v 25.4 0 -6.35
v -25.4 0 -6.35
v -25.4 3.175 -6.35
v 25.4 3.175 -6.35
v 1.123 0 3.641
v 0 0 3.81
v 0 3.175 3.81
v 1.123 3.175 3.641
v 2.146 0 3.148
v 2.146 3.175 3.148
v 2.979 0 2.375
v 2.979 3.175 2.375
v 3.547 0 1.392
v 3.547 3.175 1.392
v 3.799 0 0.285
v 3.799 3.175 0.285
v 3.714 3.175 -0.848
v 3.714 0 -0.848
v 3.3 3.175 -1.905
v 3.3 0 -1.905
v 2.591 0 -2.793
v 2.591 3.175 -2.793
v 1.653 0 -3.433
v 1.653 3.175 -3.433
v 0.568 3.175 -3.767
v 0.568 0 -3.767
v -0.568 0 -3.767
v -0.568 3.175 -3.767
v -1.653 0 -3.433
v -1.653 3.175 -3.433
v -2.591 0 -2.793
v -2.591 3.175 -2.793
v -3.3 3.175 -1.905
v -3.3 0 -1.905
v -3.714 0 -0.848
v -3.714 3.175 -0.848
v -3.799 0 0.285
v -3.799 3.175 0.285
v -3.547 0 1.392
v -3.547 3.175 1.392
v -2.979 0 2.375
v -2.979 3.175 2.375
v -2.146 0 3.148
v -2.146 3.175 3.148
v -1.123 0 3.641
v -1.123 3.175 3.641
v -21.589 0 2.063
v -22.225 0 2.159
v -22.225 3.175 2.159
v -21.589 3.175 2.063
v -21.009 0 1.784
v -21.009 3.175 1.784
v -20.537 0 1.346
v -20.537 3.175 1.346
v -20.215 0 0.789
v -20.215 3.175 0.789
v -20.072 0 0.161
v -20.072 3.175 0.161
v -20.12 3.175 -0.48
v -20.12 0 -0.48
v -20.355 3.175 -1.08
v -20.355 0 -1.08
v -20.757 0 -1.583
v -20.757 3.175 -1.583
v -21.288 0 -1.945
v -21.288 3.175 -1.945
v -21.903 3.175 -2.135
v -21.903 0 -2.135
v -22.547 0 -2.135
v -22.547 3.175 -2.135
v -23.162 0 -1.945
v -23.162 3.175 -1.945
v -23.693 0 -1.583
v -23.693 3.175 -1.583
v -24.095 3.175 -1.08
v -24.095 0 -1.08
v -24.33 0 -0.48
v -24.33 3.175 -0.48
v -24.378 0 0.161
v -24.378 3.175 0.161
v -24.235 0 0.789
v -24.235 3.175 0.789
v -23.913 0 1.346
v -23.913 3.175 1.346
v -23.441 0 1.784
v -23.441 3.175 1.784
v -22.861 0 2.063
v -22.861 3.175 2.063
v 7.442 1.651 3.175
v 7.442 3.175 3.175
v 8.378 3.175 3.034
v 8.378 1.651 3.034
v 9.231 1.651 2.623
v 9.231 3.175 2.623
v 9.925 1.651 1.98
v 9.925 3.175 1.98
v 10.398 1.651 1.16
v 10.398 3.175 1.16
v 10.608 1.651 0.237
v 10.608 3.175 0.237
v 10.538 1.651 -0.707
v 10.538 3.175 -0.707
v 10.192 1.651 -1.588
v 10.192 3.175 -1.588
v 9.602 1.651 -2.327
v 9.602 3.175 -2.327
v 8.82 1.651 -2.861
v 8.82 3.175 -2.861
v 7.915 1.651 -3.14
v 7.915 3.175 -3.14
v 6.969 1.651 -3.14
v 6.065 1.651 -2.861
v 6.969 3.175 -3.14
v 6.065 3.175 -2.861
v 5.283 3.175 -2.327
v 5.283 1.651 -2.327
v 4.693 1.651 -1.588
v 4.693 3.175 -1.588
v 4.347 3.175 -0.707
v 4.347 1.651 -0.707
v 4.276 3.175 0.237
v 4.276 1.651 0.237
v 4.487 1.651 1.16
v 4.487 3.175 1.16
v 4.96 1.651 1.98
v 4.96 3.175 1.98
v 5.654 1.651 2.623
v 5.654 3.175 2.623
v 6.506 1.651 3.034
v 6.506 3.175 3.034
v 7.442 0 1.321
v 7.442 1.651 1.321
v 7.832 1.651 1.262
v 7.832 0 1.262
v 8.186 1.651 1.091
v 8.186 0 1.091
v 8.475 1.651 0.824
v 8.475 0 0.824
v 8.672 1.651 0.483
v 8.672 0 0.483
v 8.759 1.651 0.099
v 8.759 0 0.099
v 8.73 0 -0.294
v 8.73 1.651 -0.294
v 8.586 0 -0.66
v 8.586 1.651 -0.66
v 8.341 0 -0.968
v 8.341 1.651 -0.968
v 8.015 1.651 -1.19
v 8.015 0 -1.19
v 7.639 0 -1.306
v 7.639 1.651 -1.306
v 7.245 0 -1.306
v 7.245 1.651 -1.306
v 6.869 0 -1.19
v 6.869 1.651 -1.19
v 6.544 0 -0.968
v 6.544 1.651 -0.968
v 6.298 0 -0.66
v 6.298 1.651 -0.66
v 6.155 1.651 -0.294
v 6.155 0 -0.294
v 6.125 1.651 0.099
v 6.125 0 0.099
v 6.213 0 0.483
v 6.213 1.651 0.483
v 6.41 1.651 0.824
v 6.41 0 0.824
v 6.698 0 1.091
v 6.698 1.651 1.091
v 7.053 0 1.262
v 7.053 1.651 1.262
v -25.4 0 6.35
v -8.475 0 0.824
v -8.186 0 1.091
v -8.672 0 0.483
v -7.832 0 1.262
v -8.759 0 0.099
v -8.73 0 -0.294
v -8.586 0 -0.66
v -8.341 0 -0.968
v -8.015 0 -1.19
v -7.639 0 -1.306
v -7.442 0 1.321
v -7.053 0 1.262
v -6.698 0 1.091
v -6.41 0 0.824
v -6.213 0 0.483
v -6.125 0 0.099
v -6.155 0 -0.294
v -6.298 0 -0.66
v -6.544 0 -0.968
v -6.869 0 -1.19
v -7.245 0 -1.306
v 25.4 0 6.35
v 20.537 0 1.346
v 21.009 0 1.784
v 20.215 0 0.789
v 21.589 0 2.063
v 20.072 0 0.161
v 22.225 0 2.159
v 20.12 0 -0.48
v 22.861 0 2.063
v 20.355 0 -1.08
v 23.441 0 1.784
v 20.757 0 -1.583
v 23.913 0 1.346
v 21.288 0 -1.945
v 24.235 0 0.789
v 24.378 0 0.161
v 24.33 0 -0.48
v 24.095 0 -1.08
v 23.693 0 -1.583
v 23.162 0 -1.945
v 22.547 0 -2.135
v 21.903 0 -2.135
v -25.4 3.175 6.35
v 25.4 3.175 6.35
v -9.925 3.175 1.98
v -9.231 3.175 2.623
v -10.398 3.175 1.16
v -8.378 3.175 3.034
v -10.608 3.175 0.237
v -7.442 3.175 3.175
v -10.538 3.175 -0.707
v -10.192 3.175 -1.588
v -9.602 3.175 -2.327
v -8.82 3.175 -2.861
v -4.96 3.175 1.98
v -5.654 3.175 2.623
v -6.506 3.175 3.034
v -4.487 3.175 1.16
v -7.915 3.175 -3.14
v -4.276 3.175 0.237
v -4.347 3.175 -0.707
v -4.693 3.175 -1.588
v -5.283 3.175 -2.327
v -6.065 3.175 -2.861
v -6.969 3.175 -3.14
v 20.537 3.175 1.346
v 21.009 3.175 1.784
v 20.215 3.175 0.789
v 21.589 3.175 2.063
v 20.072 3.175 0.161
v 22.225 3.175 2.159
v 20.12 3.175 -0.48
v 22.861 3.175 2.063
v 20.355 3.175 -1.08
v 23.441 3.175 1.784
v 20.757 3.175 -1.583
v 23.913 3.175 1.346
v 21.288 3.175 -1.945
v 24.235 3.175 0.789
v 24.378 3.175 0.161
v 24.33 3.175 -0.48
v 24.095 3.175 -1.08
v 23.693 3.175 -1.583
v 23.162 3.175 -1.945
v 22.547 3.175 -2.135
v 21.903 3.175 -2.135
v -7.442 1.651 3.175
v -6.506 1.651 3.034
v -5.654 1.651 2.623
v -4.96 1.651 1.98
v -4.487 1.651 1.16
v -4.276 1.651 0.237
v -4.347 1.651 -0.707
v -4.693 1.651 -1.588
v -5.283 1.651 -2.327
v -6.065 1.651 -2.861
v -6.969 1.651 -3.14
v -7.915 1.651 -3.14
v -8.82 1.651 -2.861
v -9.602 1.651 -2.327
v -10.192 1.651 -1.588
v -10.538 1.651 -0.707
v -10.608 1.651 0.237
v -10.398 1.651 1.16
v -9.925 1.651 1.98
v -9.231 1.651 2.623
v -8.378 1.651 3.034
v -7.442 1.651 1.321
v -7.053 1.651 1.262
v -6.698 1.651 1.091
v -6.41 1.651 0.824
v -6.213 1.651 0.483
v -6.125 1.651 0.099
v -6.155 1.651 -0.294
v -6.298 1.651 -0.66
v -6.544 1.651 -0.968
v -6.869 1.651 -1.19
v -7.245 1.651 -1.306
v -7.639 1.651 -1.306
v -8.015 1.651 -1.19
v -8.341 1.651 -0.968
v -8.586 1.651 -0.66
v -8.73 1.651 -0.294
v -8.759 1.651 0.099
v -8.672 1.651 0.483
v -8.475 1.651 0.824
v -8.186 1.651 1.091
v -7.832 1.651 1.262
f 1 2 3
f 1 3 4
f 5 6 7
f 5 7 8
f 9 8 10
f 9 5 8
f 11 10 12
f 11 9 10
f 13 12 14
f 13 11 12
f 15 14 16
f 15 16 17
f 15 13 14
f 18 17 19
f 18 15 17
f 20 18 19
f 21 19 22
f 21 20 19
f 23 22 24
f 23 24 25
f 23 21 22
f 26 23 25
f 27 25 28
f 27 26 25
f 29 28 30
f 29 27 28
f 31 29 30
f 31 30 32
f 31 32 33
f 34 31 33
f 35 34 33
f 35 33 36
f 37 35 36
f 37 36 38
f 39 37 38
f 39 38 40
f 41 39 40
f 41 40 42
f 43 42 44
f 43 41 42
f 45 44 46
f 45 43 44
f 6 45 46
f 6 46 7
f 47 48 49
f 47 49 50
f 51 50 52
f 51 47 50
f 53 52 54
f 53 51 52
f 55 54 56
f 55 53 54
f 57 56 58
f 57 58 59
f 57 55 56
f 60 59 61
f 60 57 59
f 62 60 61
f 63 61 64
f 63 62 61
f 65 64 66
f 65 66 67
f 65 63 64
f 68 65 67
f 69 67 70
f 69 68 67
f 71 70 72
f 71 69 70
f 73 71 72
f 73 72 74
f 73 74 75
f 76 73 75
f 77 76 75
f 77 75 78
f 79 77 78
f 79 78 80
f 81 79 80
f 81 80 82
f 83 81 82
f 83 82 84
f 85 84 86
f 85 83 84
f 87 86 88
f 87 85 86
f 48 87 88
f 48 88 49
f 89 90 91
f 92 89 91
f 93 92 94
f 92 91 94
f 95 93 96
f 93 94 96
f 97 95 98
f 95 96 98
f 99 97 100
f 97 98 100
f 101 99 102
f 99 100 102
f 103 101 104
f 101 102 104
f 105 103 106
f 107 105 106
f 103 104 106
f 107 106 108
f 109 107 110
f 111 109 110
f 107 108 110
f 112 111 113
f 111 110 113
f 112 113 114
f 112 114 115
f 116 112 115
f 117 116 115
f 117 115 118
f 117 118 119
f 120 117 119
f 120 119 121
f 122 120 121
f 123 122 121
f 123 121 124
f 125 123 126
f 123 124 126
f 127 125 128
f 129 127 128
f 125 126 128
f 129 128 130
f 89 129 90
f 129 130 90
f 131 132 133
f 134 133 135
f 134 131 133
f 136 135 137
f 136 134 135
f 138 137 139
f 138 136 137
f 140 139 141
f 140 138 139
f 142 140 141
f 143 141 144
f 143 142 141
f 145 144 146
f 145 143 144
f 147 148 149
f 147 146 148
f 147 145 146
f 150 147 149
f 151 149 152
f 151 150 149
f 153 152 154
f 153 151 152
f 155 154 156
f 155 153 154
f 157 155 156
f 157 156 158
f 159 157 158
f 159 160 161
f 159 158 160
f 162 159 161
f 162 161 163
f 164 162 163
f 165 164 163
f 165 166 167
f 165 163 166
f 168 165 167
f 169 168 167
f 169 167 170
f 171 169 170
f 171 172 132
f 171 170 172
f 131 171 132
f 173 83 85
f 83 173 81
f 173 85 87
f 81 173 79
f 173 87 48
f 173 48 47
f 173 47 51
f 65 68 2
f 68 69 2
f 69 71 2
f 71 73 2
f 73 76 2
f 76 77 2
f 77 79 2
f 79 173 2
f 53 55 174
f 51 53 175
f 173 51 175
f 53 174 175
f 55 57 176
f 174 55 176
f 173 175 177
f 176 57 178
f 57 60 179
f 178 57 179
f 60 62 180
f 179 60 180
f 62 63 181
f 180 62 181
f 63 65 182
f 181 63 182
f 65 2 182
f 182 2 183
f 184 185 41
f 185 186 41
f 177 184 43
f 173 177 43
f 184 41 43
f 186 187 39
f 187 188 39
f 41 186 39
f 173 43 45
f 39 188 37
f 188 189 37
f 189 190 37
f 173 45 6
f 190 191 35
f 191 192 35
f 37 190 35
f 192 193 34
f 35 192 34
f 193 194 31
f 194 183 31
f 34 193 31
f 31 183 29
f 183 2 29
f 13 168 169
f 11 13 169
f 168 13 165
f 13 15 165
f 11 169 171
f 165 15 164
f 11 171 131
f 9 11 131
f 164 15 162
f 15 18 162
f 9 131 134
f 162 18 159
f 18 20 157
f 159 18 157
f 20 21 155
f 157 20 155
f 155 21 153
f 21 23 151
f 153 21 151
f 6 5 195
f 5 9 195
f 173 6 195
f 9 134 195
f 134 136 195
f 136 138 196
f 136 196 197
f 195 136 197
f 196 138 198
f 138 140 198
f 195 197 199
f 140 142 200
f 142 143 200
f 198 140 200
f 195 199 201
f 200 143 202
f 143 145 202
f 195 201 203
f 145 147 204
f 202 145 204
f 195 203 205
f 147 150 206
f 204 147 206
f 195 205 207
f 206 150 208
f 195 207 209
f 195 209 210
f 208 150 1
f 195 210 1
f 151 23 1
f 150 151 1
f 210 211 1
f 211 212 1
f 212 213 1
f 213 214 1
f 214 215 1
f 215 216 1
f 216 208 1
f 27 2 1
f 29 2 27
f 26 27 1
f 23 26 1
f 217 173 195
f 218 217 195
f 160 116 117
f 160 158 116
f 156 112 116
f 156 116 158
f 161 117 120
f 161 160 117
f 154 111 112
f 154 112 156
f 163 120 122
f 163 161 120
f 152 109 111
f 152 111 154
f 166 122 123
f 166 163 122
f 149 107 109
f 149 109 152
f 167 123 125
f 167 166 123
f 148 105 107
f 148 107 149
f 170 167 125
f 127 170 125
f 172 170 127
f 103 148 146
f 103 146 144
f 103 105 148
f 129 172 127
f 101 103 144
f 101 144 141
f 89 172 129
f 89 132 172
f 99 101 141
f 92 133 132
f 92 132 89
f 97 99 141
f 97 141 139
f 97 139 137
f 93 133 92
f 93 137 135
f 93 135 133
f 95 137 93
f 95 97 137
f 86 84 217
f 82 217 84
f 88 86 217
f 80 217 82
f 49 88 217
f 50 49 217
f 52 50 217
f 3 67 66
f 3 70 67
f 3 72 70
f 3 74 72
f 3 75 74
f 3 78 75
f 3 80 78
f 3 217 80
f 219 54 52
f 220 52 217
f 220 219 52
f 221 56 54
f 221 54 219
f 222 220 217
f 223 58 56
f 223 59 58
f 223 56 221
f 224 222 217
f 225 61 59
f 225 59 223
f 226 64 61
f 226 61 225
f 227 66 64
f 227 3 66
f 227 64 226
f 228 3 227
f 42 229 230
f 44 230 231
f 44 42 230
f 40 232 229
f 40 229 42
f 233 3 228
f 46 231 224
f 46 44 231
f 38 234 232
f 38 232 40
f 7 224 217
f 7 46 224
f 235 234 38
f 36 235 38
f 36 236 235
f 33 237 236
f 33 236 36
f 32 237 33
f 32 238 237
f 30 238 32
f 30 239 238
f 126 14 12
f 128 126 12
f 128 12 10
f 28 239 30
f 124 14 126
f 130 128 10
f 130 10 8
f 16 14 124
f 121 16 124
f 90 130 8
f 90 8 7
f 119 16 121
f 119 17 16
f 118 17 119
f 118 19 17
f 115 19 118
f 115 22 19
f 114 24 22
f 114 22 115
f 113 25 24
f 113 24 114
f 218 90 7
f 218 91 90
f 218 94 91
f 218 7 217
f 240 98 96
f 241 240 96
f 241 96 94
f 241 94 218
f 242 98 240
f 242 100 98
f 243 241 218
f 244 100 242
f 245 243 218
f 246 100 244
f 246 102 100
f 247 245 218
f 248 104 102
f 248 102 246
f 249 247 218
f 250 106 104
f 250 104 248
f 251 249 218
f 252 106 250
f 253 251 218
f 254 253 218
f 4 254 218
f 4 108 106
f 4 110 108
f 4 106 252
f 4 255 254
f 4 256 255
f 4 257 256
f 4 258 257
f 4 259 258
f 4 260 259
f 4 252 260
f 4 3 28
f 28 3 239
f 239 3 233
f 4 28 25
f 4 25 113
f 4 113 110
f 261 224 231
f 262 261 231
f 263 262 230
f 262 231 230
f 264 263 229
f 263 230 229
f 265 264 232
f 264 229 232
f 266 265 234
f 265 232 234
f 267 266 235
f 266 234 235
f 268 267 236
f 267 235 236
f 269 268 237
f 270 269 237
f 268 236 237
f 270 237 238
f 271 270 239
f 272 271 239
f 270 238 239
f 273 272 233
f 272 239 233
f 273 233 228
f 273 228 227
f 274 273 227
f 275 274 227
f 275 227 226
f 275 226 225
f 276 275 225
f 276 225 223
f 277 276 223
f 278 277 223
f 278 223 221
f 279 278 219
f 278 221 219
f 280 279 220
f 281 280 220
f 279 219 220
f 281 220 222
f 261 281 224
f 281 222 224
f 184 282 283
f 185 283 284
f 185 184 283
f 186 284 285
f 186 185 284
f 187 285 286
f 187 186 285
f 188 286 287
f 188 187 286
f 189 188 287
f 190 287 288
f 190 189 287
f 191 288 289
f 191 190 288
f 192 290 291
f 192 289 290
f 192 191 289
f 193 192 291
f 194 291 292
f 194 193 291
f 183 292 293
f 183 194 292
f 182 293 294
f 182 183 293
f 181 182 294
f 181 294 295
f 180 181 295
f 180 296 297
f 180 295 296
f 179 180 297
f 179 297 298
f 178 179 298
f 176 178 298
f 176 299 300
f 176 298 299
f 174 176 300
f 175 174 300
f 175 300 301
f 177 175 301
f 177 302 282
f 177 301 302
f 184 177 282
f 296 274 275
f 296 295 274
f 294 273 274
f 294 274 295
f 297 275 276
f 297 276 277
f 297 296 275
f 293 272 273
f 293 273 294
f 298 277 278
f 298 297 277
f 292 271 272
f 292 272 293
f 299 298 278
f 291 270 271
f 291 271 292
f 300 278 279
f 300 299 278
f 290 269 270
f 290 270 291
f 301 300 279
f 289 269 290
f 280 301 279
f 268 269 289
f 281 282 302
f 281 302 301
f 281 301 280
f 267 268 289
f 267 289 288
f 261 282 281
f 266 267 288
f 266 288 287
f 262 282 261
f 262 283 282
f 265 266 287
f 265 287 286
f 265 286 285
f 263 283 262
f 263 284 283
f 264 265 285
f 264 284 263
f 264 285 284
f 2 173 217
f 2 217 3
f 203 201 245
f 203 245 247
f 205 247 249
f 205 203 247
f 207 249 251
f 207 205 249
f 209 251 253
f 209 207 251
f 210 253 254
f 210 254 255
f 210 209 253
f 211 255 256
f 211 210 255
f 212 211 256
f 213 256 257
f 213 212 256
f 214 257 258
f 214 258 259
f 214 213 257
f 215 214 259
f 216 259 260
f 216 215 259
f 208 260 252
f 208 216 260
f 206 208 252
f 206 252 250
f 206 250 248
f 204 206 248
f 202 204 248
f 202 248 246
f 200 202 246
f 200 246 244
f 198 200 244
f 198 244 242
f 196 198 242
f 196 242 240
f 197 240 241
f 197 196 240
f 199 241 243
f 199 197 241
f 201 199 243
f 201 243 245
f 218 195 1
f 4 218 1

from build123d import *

# Parameters (mm, degrees)
SKETCH1_W           = 50.8
SKETCH1_H           = 12.7
SKETCH1_R           = 3.81
SKETCH1_R_2         = 1.3208
SKETCH1_R_3         = 2.159
BOSS_EXTRUDE1_DEPTH = 3.175
SKETCH2_R           = 3.175
CUT_EXTRUDE1_DEPTH  = 1.524


with BuildPart() as part:
    # Sketch1 → Boss-Extrude1 (new body)
    with BuildSketch(Plane(origin=(0, 0, 0), x_dir=(1, 0, 0), z_dir=(0, 1, 0))):
        Rectangle(SKETCH1_W, SKETCH1_H)
        with Locations(Location((0, 0, 0), (0, 0, 270))):
            Circle(SKETCH1_R, mode=Mode.SUBTRACT)
        with Locations(Location((7.4422, 0, 0), (0, 0, 270))):
            Circle(SKETCH1_R_2, mode=Mode.SUBTRACT)
        with Locations(Location((-7.4422, 0, 0), (0, 0, 270))):
            Circle(SKETCH1_R_2, mode=Mode.SUBTRACT)
        with Locations(Location((-22.225, 0, 0), (0, 0, 270))):
            Circle(SKETCH1_R_3, mode=Mode.SUBTRACT)
        with Locations(Location((22.225, 0, 0), (0, 0, 270))):
            Circle(SKETCH1_R_3, mode=Mode.SUBTRACT)
    extrude(amount=BOSS_EXTRUDE1_DEPTH)

    # Sketch2 → Cut-Extrude1 (cut)
    with BuildSketch(Plane(origin=(0, 3.175, 0), x_dir=(1, 0, 0), z_dir=(0, 1, 0))):
        with Locations(Location((-7.4422, 0, 0), (0, 0, 270))):
            Circle(SKETCH2_R)
        with Locations(Location((7.4422, 0, 0), (0, 0, 270))):
            Circle(SKETCH2_R)
    extrude(amount=-CUT_EXTRUDE1_DEPTH, mode=Mode.SUBTRACT)


solid = part.part
